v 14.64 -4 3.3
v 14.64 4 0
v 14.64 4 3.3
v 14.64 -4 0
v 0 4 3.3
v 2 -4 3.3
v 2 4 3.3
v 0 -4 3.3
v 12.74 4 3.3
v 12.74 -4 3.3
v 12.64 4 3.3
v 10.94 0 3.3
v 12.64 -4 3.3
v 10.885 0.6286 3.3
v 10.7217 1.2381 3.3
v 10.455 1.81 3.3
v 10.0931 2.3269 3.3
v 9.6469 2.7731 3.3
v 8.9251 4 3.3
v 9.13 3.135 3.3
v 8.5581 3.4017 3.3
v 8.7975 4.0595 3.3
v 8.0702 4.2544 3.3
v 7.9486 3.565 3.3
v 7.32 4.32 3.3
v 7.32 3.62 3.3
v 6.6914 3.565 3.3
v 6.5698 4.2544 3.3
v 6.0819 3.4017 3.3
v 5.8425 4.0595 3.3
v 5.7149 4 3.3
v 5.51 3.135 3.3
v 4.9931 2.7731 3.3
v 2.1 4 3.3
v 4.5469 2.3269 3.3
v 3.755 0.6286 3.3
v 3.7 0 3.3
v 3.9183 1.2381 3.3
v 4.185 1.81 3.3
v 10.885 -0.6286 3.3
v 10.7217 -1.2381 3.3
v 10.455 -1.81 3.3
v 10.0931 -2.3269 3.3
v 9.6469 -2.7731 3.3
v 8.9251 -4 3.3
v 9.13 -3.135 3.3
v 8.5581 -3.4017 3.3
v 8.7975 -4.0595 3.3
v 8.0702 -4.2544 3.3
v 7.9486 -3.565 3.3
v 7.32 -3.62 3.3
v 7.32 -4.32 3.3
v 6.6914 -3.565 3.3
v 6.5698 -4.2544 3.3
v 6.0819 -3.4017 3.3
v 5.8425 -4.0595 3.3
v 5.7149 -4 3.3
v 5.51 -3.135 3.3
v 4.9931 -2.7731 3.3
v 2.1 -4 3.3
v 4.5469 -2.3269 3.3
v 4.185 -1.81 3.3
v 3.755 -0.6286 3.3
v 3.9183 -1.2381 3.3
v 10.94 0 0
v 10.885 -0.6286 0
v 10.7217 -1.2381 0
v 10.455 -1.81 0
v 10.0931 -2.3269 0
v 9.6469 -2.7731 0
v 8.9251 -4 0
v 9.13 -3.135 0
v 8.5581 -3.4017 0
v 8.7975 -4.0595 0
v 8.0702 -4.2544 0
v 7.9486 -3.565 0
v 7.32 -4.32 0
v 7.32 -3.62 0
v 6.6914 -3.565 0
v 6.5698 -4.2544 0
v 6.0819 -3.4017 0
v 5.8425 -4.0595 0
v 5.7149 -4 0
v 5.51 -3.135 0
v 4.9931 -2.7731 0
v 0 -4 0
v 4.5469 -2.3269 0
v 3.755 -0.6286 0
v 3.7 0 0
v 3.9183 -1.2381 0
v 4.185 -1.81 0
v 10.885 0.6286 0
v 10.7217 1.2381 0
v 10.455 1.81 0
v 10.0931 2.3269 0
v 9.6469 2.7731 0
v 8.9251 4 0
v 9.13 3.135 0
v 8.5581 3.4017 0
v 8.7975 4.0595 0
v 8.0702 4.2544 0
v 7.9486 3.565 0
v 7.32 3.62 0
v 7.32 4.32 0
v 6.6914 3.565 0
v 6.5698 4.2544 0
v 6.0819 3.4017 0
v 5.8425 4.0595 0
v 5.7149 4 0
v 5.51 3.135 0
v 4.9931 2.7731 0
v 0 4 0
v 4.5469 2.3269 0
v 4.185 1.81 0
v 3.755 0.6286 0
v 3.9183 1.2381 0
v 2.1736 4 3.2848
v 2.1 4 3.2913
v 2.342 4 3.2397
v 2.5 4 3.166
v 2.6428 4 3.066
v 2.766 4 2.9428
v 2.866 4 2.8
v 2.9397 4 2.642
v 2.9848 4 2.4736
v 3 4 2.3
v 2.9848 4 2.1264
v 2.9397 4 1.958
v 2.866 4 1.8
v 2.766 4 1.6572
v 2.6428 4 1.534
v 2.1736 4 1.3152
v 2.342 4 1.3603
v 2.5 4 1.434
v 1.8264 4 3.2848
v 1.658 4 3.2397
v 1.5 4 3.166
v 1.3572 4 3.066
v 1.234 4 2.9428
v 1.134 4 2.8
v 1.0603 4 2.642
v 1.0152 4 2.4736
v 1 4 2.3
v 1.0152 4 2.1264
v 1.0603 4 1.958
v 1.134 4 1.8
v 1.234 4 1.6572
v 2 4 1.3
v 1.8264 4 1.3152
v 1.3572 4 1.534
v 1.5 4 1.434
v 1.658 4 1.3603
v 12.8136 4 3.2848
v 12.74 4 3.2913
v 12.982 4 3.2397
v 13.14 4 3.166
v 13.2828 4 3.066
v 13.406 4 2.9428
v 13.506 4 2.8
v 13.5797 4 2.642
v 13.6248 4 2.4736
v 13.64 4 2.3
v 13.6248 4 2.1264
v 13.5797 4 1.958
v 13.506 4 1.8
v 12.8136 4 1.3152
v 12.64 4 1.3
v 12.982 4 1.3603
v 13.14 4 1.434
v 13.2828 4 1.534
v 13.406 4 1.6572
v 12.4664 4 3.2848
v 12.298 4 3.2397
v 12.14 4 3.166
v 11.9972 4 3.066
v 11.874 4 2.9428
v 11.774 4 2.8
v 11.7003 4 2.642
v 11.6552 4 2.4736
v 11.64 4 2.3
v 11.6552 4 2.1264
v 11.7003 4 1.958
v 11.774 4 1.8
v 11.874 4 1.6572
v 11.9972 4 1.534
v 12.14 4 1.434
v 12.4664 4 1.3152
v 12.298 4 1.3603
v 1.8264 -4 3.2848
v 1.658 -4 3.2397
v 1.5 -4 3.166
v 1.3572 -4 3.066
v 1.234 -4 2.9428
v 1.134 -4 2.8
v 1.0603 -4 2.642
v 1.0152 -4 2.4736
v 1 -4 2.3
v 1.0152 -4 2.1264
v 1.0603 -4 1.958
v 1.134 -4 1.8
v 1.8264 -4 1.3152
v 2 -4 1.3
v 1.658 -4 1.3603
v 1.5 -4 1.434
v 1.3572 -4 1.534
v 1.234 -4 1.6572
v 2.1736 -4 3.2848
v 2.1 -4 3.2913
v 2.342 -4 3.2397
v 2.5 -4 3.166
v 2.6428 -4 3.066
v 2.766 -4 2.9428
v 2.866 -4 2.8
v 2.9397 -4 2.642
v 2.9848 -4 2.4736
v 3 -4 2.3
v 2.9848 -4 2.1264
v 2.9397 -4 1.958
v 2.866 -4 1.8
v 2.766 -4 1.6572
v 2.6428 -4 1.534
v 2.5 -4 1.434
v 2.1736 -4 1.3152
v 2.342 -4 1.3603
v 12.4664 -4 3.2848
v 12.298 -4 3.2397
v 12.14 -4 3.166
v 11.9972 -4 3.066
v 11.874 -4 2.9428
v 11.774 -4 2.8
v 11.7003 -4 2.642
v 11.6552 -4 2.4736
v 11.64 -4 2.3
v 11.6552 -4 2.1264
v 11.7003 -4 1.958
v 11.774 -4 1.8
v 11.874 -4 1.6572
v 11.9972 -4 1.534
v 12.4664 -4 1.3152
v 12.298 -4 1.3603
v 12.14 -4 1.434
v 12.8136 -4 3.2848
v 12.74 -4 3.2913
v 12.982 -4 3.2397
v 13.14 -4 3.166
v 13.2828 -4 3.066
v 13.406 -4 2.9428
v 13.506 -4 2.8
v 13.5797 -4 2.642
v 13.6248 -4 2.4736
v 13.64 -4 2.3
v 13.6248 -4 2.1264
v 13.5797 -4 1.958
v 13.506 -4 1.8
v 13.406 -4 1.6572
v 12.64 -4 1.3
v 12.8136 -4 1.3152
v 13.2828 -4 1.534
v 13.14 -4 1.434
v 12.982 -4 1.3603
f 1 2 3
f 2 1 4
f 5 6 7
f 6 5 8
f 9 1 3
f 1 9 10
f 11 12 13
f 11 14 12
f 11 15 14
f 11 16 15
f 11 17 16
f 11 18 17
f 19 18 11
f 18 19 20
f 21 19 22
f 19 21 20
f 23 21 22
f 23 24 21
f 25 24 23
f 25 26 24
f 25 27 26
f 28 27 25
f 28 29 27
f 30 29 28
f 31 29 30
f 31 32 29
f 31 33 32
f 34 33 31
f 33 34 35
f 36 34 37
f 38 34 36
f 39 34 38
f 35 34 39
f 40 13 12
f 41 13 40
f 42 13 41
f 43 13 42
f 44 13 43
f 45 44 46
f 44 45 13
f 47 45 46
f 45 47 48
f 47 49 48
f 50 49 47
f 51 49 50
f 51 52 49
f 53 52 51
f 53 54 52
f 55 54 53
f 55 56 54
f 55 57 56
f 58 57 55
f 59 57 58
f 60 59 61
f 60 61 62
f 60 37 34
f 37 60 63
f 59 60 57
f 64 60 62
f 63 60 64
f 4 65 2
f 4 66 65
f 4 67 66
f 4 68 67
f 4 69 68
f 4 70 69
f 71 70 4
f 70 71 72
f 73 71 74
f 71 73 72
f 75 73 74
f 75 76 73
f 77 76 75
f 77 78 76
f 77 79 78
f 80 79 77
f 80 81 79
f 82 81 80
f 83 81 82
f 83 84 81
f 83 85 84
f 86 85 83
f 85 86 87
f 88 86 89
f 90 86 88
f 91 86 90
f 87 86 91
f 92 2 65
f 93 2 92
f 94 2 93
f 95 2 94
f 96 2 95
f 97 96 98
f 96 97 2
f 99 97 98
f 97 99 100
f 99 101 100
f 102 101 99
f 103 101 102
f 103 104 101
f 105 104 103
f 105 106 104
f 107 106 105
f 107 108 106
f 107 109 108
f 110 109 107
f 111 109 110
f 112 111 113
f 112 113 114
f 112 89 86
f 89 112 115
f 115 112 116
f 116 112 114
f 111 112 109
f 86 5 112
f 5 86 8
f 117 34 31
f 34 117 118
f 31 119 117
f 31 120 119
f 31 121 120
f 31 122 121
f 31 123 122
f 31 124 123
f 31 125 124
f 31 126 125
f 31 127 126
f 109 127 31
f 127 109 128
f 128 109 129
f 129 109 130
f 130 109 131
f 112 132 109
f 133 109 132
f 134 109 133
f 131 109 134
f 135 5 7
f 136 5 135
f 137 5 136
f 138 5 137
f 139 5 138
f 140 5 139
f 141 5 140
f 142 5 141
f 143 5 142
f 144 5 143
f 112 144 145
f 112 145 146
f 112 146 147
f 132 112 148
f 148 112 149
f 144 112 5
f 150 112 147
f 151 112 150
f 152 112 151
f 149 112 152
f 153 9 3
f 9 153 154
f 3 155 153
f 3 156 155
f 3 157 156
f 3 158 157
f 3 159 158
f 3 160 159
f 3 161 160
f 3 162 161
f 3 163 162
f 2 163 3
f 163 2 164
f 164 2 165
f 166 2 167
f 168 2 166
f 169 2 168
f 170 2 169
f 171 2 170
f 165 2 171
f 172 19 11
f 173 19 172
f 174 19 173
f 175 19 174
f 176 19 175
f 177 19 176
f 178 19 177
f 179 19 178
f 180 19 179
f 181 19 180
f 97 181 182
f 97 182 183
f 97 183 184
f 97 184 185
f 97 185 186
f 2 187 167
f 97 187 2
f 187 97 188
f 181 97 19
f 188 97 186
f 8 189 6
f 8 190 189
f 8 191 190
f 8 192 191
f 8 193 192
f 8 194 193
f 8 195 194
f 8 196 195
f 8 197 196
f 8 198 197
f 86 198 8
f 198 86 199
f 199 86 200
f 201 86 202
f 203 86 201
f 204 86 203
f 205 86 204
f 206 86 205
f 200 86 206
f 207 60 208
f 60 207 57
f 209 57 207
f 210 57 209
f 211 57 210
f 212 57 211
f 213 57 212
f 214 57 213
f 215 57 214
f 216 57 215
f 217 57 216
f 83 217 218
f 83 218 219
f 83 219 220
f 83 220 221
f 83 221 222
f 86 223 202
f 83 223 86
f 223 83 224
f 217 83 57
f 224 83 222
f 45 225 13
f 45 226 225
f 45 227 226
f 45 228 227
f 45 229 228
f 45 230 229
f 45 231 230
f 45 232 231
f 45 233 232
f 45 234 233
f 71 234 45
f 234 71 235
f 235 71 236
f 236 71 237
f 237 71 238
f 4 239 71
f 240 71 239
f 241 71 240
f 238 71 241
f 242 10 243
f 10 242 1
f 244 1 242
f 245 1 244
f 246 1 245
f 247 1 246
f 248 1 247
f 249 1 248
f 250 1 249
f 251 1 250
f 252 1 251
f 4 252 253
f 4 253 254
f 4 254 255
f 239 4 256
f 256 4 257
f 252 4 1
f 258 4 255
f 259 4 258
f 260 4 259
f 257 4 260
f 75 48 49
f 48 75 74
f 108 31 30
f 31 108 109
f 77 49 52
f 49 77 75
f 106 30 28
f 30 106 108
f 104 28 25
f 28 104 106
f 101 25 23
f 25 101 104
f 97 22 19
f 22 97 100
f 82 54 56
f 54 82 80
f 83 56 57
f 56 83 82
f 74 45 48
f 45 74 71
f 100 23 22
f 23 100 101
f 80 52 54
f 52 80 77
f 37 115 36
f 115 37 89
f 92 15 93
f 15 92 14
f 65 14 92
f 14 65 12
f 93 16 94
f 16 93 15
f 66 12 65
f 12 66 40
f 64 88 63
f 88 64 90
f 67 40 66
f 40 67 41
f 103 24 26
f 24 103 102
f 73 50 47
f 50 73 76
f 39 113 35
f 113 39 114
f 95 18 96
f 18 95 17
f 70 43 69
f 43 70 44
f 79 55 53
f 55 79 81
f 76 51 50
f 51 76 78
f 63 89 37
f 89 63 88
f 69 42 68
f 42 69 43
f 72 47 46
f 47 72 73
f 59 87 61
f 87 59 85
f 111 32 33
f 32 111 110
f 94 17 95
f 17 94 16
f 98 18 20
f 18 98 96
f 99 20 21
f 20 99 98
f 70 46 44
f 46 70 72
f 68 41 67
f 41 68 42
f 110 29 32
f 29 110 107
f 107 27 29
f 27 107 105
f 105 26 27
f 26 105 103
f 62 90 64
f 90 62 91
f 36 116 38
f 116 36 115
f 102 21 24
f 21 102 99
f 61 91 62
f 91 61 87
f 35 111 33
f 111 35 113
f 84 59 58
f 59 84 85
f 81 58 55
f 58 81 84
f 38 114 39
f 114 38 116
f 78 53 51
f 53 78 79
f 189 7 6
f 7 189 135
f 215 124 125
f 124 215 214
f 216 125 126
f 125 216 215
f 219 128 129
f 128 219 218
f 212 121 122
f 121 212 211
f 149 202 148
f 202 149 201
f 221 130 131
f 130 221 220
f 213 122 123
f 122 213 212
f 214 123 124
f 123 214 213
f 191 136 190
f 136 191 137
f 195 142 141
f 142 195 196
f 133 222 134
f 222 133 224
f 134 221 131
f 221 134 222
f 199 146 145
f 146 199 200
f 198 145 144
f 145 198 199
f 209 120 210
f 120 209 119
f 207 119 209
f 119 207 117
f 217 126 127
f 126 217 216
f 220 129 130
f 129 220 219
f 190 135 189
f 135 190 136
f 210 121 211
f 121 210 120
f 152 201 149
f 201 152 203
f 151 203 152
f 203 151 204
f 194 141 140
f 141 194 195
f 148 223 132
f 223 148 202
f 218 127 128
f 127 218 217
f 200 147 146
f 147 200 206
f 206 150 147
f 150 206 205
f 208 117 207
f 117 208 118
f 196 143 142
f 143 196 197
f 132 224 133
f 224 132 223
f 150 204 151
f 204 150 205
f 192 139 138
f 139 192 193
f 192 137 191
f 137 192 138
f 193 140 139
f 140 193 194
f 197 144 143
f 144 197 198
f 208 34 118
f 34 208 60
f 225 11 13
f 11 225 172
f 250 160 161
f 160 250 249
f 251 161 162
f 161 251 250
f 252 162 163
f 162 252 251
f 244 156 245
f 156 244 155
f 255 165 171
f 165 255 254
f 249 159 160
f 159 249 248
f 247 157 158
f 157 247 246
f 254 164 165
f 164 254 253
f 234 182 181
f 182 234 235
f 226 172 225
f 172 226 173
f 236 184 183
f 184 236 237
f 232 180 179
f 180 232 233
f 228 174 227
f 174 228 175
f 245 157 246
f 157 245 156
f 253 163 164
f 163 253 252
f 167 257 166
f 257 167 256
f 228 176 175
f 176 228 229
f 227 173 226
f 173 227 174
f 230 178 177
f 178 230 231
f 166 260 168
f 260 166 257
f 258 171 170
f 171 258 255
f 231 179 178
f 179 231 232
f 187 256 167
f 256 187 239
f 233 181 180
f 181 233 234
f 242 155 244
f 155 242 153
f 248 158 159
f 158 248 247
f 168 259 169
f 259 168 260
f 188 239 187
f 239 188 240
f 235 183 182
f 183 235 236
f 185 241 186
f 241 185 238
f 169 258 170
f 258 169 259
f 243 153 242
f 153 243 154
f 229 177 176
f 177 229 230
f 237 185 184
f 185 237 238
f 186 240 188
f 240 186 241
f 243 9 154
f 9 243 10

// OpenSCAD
// Customizable Simple Macro Lens Holder 
//
// Default parameters are for the lens:
//      Size: 7 x 3.3 mm
//      BFL : 6.47 mm
//      ELF : 8.0 mm
//
//  2016.05.18 by gsyan
//
//  update : 2016.05.20
//

//preview[view:south west, tilt:top diagonal];

/* [LENS] */

//Default parameters are for the lens : Size: 7 x 3.3 mm , BFL : 6.47 mm , ELF : 8.0 mm
lens_diameter = 7.04;

lens_height = 3.3;

lens_total = 1;

//Lens distance adapt for lens_total > 1
lens_distance = 0;

lens_holder_wall_thickness = 1.6;

/* [Ruber_Band] */

rubber_band_hole_diameter = 2;

rubber_band_holder_width = 8;

/* [Hidden] */
fn = 36;


module base() {        
    union() {
        //base : cube
        translate([0, rubber_band_holder_width/-2, 0]) 
        cube([lens_diameter+lens_holder_wall_thickness+rubber_band_hole_diameter*3,rubber_band_holder_width, lens_height]);    //base : cylinder    
        translate([(lens_diameter+lens_holder_wall_thickness+rubber_band_hole_diameter*3)/2, 0, 0])
        cylinder(h=lens_height*lens_total+lens_distance*(lens_total-1), r=(lens_diameter+lens_holder_wall_thickness)/2, $fn=fn);
    }
}
module holder() {
    difference() {
        base();
        
        //lens hole
        translate([(lens_diameter+lens_holder_wall_thickness+rubber_band_hole_diameter*3)/2, 0, -0.1])
        cylinder(h=lens_height*lens_total+lens_distance*(lens_total-1)+1, r=(lens_diameter+0.2)/2, $fn=fn);
        
        /*
        translate([(lens_diameter+lens_holder_wall_thickness+rubber_band_hole_diameter*3)/2, 0, -0.2])
        cylinder(h=lens_height, r=(lens_diameter-0.1)/2, $fn=fn);
        */
        
        //left rubber band hole
        translate([rubber_band_hole_diameter, (rubber_band_holder_width+1)/2, lens_height-rubber_band_hole_diameter/2]) rotate(a=[90,0,0]) 
        cylinder(h=rubber_band_holder_width+1, d=rubber_band_hole_diameter, $fn=36);
        translate([rubber_band_hole_diameter, (rubber_band_holder_width+1)/-2, lens_height-rubber_band_hole_diameter/2+0.5]) cube([0.1, rubber_band_holder_width+1,1]);
                
        //right rubber band hole
        translate([lens_diameter+lens_holder_wall_thickness+rubber_band_hole_diameter*2, (rubber_band_holder_width+1)/2, lens_height-rubber_band_hole_diameter/2]) rotate(a=[90,0,0]) 
        cylinder(h=rubber_band_holder_width+1, d=rubber_band_hole_diameter, $fn=36);
        translate([lens_diameter+lens_holder_wall_thickness+rubber_band_hole_diameter*2, (rubber_band_holder_width+1)/-2, lens_height-rubber_band_hole_diameter/2+0.5]) cube([0.1, rubber_band_holder_width+1,1]);
    }
}

holder();
